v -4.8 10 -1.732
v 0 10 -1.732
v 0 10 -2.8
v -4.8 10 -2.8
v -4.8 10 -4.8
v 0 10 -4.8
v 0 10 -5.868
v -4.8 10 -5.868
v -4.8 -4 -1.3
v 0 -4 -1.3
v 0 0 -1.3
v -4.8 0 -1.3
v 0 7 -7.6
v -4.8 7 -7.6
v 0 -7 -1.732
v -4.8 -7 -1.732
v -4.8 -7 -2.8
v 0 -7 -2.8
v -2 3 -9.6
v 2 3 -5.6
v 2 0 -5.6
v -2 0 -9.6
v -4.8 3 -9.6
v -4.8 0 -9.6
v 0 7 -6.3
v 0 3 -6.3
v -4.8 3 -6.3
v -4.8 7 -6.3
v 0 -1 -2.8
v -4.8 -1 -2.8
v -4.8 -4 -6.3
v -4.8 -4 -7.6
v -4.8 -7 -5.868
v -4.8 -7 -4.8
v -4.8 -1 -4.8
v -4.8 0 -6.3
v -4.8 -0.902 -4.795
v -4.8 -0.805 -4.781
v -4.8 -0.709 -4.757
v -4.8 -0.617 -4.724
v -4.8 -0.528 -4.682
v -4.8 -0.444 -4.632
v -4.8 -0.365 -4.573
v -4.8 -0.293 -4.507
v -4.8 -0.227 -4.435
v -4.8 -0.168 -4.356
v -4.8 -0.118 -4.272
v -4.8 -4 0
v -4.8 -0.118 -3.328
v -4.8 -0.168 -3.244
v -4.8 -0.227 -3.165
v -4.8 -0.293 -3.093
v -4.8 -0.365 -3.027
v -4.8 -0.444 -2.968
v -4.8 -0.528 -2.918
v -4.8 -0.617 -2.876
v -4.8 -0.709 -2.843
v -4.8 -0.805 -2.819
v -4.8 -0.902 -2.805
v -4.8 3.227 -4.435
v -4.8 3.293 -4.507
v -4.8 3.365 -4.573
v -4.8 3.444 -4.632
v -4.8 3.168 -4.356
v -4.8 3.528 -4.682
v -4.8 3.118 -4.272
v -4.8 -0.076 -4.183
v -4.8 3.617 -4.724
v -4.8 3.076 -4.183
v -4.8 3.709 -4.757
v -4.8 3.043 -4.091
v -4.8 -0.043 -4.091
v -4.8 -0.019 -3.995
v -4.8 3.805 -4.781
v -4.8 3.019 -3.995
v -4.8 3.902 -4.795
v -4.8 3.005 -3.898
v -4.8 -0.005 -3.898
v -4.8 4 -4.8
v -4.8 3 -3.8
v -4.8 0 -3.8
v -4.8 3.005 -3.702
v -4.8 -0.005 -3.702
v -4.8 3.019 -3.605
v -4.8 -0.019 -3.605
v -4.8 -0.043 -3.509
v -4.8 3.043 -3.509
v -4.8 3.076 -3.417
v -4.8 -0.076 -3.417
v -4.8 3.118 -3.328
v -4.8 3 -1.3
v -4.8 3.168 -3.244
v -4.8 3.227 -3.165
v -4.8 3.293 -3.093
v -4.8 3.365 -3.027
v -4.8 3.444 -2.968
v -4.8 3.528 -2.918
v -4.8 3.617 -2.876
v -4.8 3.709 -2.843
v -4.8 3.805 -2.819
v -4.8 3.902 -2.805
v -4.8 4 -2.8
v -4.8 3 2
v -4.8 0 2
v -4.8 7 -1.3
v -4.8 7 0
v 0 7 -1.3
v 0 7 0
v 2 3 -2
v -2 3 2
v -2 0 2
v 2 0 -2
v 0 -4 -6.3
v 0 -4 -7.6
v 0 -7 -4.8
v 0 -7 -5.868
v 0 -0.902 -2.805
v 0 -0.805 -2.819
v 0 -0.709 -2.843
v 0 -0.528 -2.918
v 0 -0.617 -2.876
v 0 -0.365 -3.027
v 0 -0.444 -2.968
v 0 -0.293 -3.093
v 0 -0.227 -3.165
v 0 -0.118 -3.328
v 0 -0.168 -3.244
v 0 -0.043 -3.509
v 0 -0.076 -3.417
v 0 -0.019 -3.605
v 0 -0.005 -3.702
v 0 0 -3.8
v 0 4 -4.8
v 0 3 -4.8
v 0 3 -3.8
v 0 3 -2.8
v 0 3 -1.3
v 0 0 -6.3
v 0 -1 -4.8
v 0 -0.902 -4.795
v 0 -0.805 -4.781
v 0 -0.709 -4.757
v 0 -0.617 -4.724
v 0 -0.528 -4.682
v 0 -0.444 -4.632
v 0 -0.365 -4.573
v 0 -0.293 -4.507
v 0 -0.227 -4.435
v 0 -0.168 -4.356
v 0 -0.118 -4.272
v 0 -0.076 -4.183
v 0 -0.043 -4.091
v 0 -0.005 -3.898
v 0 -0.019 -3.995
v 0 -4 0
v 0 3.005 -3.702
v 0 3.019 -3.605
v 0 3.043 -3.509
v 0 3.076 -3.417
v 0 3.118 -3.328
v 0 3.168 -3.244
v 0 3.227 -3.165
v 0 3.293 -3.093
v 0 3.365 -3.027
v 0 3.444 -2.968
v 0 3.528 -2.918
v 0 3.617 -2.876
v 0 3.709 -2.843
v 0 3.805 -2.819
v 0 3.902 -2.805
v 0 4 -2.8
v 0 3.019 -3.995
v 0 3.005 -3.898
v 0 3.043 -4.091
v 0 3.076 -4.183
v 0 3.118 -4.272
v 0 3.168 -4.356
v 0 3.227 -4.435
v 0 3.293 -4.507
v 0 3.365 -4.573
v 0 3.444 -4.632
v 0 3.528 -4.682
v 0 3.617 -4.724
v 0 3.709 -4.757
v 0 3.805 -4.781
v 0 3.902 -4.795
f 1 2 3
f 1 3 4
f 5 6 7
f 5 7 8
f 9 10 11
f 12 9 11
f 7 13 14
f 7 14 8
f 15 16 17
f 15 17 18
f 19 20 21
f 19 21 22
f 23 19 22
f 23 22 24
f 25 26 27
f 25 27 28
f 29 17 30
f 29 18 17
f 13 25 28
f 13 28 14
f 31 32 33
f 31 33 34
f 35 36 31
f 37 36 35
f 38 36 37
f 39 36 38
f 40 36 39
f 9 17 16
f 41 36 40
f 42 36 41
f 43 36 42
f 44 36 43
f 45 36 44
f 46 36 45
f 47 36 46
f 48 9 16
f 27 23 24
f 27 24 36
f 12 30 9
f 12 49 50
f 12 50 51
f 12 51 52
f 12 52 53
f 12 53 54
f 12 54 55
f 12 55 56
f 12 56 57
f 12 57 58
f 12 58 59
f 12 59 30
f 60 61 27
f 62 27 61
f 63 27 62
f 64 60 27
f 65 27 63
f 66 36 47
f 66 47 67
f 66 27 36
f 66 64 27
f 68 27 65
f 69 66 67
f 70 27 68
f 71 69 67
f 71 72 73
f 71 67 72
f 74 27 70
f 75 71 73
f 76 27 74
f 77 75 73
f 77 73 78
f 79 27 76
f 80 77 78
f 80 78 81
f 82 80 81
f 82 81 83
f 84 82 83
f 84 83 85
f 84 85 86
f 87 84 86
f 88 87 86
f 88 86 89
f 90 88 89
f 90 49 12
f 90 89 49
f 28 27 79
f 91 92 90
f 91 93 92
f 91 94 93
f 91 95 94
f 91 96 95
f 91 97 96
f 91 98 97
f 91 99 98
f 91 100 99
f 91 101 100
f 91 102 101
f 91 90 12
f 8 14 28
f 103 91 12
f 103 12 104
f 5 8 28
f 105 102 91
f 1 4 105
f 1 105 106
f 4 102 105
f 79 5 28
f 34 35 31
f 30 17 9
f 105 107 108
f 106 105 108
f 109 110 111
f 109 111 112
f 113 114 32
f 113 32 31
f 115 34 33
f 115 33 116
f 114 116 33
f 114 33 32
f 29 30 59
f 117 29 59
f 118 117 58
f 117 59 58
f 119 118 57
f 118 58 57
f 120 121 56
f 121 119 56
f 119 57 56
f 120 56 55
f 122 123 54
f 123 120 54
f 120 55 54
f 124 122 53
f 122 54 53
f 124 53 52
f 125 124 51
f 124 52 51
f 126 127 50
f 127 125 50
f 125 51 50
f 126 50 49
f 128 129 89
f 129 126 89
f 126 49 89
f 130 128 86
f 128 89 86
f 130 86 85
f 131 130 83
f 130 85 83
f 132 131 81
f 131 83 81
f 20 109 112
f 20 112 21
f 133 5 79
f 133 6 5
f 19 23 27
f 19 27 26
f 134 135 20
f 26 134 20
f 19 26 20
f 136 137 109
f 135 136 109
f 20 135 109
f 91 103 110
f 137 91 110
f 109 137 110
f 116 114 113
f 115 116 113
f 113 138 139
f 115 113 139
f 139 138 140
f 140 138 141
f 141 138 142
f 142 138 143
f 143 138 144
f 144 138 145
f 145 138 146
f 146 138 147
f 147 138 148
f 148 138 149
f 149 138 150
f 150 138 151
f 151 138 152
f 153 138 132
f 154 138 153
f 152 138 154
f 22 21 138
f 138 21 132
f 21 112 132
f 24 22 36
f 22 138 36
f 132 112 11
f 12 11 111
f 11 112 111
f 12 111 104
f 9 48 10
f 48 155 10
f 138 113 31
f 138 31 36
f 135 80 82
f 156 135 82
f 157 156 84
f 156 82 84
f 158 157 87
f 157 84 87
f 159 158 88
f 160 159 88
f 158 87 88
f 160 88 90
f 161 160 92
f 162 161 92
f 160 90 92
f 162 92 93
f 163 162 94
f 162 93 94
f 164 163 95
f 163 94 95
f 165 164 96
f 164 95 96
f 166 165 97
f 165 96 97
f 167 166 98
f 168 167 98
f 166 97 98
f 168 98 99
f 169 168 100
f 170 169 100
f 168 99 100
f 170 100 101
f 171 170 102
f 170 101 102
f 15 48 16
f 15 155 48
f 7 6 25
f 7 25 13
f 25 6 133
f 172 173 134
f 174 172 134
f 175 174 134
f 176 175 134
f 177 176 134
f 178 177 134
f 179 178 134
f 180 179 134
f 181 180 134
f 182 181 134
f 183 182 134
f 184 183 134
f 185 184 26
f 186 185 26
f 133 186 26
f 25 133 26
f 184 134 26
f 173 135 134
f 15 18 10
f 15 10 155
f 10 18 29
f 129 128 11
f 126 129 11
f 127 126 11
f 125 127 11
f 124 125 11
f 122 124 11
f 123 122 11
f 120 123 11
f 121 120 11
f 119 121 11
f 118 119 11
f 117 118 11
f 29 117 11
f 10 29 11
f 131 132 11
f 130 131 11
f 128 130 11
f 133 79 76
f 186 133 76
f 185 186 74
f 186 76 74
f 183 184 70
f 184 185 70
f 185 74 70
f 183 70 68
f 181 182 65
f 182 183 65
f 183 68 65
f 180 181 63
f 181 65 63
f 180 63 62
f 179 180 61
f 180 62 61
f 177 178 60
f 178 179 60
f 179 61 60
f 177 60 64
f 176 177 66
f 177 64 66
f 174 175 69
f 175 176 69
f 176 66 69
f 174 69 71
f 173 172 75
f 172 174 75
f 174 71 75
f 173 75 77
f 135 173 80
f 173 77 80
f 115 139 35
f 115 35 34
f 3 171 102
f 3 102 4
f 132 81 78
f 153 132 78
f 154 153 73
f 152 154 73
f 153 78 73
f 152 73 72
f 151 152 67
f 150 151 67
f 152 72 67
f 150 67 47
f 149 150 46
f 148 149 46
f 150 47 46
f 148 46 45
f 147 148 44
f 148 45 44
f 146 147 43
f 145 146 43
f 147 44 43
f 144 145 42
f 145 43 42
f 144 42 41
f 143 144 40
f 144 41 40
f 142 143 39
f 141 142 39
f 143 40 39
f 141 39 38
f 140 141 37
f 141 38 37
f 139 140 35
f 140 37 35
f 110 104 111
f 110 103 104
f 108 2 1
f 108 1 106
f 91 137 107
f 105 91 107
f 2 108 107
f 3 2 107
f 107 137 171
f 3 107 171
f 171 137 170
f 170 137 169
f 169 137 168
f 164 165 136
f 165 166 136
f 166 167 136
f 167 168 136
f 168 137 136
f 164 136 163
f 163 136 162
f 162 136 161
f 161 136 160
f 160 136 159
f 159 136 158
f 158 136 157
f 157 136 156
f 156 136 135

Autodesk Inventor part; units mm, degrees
ref_plane "YZ Plane" through (0, 0, 0) normal (1, 0, 0) x (0, 1, 0)
ref_plane "XZ Plane" through (0, 0, 0) normal (0, 1, 0) x (-1, 0, 0)
ref_plane "XY Plane" through (0, 0, 0) normal (0, 0, 1) x (1, 0, 0)
sketch "Sketch1" plane through (0, 0, 0) normal (0, 1, 0) x (-1, 0, 0)
  line L0 (0, 0) -> (4.8, 0) construction
  line L1 (4.8, 0) -> (4.8, -7.6) construction
  line L2 (4.8, -7.6) -> (0, -7.6) construction
  line L3 (0, -7.6) -> (0, 0) construction
  line L4 (4.8, -9.6) -> (2, -9.6)
  line L5 (2, -9.6) -> (-2, -5.6)
  line L6 (-2, -5.6) -> (-2, -2)
  line L7 (-2, -2) -> (2, 2)
  line L8 (2, 2) -> (4.8, 2)
  line L9 (4.8, 2) -> (4.8, -9.6)
  line L10 (2.4, 0) -> (2.4, 2) construction
  line L11 (-2, -3.8) -> (0, -3.8) construction
  line L12 (2.4, -7.6) -> (2.4, -9.6) construction
  dimension "d0" = 7.6
  dimension "d1" = 4.8
  dimension "d2" = 2
extrude "Extrusion1" add sketch "Sketch1" along normal blind 1.5
sketch "Sketch2" plane through (0, 0, 0) normal (0, -1, 0) x (1, 0, 0)
  line L0 (-4.8, -9.6) -> (-4.8, 2) projected
  line L1 (0, 0) -> (-4.8, 0)
  line L2 (-4.8, 0) -> (-4.8, -7.6)
  line L3 (-4.8, -7.6) -> (0, -7.6)
  line L4 (0, -7.6) -> (0, 0)
  line L5 (2, -5.6) -> (-2, -9.6) projected
extrude "Extrusion2" add sketch "Sketch2" along normal blind 7
sketch "Sketch3" plane through (0, 0, 0) normal (1, 0, 0) x (0, 0, -1)
  line L0 (-17.9, 0) -> (-18, 0)
  line L1 (-18, 1) -> (-17.9, 1) construction
  line L2 (0, 0) -> (0, -7)
  line L3 (0, -4) -> (1.7321, -7)
  line L4 (2.8, -7) -> (2.8, 0)
  line L5 (2.8, 0) -> (4.8, 0)
  line L6 (4.8, 0) -> (4.8, -7)
  line L7 (4.8, -7) -> (5.8679, -7)
  line L8 (5.8679, -7) -> (7.6, -4)
  line L9 (7.6, -4) -> (6.3, -4)
  line L10 (6.3, -4) -> (6.3, 0)
  line L11 (7.6, 0) -> (7.6, -7.2498)
  line L12 (6.3, 0) -> (7.6, 0)
  line L13 (2.8, -7) -> (1.7321, -7)
  line L14 (0, -4) -> (1.3, -4)
  line L15 (1.3, -4) -> (1.3, 0)
  line L16 (1.3, 0) -> (0, 0)
  line L17 (0, 0) -> (0, -7)
  line L18 (0, -4) -> (0, -7)
  line L19 (0, -7) -> (1.7321, -7)
  line L20 (7.6, 0) -> (7.6, -4)
  line L21 (3.8, -6.9306) -> (3.8, 0) construction
  line L22 (6.3, -4) -> (4.8, -4) construction
  line L23 (1.3, -4) -> (2.8, -4) construction
  line L24 (-17.9, 0) -> (-18, 0)
  line L25 (-18, 1) -> (-17.9, 1) construction
  line L26 (0, 0) -> (0, -7) projected
  line L27 (2, 0) -> (5.6, 0) projected
  line L28 (7.6, -7) -> (0, -7) projected
  line L29 (2.8, -7) -> (4.8, -7)
  line L30 (5.8679, -7) -> (7.6, -7)
  point P0 (2.8, -7)
  point P1 (4.8, -7)
  dimension "d14" = 4
  dimension "d15" = 1.5
  dimension "d16" = 1
  dimension "d17" = 60
  dimension "d18" = 7.6
  dimension "d20" = 1.3
extrude "Extrusion3" cut sketch "Sketch3" against normal up to surface (4.8 mm away)
fillet "Fillet1" radius 1 2 edges at (-2.4, 0, -4.8) (-2.4, 0, -2.8)
mirror "Mirror1" about plane through (-1.4, 1.5, -3.8) normal (0, 1, 0) of "Extrusion1", "Extrusion2", "Extrusion3", "Fillet1"
properties part number "PlugbothWays"
